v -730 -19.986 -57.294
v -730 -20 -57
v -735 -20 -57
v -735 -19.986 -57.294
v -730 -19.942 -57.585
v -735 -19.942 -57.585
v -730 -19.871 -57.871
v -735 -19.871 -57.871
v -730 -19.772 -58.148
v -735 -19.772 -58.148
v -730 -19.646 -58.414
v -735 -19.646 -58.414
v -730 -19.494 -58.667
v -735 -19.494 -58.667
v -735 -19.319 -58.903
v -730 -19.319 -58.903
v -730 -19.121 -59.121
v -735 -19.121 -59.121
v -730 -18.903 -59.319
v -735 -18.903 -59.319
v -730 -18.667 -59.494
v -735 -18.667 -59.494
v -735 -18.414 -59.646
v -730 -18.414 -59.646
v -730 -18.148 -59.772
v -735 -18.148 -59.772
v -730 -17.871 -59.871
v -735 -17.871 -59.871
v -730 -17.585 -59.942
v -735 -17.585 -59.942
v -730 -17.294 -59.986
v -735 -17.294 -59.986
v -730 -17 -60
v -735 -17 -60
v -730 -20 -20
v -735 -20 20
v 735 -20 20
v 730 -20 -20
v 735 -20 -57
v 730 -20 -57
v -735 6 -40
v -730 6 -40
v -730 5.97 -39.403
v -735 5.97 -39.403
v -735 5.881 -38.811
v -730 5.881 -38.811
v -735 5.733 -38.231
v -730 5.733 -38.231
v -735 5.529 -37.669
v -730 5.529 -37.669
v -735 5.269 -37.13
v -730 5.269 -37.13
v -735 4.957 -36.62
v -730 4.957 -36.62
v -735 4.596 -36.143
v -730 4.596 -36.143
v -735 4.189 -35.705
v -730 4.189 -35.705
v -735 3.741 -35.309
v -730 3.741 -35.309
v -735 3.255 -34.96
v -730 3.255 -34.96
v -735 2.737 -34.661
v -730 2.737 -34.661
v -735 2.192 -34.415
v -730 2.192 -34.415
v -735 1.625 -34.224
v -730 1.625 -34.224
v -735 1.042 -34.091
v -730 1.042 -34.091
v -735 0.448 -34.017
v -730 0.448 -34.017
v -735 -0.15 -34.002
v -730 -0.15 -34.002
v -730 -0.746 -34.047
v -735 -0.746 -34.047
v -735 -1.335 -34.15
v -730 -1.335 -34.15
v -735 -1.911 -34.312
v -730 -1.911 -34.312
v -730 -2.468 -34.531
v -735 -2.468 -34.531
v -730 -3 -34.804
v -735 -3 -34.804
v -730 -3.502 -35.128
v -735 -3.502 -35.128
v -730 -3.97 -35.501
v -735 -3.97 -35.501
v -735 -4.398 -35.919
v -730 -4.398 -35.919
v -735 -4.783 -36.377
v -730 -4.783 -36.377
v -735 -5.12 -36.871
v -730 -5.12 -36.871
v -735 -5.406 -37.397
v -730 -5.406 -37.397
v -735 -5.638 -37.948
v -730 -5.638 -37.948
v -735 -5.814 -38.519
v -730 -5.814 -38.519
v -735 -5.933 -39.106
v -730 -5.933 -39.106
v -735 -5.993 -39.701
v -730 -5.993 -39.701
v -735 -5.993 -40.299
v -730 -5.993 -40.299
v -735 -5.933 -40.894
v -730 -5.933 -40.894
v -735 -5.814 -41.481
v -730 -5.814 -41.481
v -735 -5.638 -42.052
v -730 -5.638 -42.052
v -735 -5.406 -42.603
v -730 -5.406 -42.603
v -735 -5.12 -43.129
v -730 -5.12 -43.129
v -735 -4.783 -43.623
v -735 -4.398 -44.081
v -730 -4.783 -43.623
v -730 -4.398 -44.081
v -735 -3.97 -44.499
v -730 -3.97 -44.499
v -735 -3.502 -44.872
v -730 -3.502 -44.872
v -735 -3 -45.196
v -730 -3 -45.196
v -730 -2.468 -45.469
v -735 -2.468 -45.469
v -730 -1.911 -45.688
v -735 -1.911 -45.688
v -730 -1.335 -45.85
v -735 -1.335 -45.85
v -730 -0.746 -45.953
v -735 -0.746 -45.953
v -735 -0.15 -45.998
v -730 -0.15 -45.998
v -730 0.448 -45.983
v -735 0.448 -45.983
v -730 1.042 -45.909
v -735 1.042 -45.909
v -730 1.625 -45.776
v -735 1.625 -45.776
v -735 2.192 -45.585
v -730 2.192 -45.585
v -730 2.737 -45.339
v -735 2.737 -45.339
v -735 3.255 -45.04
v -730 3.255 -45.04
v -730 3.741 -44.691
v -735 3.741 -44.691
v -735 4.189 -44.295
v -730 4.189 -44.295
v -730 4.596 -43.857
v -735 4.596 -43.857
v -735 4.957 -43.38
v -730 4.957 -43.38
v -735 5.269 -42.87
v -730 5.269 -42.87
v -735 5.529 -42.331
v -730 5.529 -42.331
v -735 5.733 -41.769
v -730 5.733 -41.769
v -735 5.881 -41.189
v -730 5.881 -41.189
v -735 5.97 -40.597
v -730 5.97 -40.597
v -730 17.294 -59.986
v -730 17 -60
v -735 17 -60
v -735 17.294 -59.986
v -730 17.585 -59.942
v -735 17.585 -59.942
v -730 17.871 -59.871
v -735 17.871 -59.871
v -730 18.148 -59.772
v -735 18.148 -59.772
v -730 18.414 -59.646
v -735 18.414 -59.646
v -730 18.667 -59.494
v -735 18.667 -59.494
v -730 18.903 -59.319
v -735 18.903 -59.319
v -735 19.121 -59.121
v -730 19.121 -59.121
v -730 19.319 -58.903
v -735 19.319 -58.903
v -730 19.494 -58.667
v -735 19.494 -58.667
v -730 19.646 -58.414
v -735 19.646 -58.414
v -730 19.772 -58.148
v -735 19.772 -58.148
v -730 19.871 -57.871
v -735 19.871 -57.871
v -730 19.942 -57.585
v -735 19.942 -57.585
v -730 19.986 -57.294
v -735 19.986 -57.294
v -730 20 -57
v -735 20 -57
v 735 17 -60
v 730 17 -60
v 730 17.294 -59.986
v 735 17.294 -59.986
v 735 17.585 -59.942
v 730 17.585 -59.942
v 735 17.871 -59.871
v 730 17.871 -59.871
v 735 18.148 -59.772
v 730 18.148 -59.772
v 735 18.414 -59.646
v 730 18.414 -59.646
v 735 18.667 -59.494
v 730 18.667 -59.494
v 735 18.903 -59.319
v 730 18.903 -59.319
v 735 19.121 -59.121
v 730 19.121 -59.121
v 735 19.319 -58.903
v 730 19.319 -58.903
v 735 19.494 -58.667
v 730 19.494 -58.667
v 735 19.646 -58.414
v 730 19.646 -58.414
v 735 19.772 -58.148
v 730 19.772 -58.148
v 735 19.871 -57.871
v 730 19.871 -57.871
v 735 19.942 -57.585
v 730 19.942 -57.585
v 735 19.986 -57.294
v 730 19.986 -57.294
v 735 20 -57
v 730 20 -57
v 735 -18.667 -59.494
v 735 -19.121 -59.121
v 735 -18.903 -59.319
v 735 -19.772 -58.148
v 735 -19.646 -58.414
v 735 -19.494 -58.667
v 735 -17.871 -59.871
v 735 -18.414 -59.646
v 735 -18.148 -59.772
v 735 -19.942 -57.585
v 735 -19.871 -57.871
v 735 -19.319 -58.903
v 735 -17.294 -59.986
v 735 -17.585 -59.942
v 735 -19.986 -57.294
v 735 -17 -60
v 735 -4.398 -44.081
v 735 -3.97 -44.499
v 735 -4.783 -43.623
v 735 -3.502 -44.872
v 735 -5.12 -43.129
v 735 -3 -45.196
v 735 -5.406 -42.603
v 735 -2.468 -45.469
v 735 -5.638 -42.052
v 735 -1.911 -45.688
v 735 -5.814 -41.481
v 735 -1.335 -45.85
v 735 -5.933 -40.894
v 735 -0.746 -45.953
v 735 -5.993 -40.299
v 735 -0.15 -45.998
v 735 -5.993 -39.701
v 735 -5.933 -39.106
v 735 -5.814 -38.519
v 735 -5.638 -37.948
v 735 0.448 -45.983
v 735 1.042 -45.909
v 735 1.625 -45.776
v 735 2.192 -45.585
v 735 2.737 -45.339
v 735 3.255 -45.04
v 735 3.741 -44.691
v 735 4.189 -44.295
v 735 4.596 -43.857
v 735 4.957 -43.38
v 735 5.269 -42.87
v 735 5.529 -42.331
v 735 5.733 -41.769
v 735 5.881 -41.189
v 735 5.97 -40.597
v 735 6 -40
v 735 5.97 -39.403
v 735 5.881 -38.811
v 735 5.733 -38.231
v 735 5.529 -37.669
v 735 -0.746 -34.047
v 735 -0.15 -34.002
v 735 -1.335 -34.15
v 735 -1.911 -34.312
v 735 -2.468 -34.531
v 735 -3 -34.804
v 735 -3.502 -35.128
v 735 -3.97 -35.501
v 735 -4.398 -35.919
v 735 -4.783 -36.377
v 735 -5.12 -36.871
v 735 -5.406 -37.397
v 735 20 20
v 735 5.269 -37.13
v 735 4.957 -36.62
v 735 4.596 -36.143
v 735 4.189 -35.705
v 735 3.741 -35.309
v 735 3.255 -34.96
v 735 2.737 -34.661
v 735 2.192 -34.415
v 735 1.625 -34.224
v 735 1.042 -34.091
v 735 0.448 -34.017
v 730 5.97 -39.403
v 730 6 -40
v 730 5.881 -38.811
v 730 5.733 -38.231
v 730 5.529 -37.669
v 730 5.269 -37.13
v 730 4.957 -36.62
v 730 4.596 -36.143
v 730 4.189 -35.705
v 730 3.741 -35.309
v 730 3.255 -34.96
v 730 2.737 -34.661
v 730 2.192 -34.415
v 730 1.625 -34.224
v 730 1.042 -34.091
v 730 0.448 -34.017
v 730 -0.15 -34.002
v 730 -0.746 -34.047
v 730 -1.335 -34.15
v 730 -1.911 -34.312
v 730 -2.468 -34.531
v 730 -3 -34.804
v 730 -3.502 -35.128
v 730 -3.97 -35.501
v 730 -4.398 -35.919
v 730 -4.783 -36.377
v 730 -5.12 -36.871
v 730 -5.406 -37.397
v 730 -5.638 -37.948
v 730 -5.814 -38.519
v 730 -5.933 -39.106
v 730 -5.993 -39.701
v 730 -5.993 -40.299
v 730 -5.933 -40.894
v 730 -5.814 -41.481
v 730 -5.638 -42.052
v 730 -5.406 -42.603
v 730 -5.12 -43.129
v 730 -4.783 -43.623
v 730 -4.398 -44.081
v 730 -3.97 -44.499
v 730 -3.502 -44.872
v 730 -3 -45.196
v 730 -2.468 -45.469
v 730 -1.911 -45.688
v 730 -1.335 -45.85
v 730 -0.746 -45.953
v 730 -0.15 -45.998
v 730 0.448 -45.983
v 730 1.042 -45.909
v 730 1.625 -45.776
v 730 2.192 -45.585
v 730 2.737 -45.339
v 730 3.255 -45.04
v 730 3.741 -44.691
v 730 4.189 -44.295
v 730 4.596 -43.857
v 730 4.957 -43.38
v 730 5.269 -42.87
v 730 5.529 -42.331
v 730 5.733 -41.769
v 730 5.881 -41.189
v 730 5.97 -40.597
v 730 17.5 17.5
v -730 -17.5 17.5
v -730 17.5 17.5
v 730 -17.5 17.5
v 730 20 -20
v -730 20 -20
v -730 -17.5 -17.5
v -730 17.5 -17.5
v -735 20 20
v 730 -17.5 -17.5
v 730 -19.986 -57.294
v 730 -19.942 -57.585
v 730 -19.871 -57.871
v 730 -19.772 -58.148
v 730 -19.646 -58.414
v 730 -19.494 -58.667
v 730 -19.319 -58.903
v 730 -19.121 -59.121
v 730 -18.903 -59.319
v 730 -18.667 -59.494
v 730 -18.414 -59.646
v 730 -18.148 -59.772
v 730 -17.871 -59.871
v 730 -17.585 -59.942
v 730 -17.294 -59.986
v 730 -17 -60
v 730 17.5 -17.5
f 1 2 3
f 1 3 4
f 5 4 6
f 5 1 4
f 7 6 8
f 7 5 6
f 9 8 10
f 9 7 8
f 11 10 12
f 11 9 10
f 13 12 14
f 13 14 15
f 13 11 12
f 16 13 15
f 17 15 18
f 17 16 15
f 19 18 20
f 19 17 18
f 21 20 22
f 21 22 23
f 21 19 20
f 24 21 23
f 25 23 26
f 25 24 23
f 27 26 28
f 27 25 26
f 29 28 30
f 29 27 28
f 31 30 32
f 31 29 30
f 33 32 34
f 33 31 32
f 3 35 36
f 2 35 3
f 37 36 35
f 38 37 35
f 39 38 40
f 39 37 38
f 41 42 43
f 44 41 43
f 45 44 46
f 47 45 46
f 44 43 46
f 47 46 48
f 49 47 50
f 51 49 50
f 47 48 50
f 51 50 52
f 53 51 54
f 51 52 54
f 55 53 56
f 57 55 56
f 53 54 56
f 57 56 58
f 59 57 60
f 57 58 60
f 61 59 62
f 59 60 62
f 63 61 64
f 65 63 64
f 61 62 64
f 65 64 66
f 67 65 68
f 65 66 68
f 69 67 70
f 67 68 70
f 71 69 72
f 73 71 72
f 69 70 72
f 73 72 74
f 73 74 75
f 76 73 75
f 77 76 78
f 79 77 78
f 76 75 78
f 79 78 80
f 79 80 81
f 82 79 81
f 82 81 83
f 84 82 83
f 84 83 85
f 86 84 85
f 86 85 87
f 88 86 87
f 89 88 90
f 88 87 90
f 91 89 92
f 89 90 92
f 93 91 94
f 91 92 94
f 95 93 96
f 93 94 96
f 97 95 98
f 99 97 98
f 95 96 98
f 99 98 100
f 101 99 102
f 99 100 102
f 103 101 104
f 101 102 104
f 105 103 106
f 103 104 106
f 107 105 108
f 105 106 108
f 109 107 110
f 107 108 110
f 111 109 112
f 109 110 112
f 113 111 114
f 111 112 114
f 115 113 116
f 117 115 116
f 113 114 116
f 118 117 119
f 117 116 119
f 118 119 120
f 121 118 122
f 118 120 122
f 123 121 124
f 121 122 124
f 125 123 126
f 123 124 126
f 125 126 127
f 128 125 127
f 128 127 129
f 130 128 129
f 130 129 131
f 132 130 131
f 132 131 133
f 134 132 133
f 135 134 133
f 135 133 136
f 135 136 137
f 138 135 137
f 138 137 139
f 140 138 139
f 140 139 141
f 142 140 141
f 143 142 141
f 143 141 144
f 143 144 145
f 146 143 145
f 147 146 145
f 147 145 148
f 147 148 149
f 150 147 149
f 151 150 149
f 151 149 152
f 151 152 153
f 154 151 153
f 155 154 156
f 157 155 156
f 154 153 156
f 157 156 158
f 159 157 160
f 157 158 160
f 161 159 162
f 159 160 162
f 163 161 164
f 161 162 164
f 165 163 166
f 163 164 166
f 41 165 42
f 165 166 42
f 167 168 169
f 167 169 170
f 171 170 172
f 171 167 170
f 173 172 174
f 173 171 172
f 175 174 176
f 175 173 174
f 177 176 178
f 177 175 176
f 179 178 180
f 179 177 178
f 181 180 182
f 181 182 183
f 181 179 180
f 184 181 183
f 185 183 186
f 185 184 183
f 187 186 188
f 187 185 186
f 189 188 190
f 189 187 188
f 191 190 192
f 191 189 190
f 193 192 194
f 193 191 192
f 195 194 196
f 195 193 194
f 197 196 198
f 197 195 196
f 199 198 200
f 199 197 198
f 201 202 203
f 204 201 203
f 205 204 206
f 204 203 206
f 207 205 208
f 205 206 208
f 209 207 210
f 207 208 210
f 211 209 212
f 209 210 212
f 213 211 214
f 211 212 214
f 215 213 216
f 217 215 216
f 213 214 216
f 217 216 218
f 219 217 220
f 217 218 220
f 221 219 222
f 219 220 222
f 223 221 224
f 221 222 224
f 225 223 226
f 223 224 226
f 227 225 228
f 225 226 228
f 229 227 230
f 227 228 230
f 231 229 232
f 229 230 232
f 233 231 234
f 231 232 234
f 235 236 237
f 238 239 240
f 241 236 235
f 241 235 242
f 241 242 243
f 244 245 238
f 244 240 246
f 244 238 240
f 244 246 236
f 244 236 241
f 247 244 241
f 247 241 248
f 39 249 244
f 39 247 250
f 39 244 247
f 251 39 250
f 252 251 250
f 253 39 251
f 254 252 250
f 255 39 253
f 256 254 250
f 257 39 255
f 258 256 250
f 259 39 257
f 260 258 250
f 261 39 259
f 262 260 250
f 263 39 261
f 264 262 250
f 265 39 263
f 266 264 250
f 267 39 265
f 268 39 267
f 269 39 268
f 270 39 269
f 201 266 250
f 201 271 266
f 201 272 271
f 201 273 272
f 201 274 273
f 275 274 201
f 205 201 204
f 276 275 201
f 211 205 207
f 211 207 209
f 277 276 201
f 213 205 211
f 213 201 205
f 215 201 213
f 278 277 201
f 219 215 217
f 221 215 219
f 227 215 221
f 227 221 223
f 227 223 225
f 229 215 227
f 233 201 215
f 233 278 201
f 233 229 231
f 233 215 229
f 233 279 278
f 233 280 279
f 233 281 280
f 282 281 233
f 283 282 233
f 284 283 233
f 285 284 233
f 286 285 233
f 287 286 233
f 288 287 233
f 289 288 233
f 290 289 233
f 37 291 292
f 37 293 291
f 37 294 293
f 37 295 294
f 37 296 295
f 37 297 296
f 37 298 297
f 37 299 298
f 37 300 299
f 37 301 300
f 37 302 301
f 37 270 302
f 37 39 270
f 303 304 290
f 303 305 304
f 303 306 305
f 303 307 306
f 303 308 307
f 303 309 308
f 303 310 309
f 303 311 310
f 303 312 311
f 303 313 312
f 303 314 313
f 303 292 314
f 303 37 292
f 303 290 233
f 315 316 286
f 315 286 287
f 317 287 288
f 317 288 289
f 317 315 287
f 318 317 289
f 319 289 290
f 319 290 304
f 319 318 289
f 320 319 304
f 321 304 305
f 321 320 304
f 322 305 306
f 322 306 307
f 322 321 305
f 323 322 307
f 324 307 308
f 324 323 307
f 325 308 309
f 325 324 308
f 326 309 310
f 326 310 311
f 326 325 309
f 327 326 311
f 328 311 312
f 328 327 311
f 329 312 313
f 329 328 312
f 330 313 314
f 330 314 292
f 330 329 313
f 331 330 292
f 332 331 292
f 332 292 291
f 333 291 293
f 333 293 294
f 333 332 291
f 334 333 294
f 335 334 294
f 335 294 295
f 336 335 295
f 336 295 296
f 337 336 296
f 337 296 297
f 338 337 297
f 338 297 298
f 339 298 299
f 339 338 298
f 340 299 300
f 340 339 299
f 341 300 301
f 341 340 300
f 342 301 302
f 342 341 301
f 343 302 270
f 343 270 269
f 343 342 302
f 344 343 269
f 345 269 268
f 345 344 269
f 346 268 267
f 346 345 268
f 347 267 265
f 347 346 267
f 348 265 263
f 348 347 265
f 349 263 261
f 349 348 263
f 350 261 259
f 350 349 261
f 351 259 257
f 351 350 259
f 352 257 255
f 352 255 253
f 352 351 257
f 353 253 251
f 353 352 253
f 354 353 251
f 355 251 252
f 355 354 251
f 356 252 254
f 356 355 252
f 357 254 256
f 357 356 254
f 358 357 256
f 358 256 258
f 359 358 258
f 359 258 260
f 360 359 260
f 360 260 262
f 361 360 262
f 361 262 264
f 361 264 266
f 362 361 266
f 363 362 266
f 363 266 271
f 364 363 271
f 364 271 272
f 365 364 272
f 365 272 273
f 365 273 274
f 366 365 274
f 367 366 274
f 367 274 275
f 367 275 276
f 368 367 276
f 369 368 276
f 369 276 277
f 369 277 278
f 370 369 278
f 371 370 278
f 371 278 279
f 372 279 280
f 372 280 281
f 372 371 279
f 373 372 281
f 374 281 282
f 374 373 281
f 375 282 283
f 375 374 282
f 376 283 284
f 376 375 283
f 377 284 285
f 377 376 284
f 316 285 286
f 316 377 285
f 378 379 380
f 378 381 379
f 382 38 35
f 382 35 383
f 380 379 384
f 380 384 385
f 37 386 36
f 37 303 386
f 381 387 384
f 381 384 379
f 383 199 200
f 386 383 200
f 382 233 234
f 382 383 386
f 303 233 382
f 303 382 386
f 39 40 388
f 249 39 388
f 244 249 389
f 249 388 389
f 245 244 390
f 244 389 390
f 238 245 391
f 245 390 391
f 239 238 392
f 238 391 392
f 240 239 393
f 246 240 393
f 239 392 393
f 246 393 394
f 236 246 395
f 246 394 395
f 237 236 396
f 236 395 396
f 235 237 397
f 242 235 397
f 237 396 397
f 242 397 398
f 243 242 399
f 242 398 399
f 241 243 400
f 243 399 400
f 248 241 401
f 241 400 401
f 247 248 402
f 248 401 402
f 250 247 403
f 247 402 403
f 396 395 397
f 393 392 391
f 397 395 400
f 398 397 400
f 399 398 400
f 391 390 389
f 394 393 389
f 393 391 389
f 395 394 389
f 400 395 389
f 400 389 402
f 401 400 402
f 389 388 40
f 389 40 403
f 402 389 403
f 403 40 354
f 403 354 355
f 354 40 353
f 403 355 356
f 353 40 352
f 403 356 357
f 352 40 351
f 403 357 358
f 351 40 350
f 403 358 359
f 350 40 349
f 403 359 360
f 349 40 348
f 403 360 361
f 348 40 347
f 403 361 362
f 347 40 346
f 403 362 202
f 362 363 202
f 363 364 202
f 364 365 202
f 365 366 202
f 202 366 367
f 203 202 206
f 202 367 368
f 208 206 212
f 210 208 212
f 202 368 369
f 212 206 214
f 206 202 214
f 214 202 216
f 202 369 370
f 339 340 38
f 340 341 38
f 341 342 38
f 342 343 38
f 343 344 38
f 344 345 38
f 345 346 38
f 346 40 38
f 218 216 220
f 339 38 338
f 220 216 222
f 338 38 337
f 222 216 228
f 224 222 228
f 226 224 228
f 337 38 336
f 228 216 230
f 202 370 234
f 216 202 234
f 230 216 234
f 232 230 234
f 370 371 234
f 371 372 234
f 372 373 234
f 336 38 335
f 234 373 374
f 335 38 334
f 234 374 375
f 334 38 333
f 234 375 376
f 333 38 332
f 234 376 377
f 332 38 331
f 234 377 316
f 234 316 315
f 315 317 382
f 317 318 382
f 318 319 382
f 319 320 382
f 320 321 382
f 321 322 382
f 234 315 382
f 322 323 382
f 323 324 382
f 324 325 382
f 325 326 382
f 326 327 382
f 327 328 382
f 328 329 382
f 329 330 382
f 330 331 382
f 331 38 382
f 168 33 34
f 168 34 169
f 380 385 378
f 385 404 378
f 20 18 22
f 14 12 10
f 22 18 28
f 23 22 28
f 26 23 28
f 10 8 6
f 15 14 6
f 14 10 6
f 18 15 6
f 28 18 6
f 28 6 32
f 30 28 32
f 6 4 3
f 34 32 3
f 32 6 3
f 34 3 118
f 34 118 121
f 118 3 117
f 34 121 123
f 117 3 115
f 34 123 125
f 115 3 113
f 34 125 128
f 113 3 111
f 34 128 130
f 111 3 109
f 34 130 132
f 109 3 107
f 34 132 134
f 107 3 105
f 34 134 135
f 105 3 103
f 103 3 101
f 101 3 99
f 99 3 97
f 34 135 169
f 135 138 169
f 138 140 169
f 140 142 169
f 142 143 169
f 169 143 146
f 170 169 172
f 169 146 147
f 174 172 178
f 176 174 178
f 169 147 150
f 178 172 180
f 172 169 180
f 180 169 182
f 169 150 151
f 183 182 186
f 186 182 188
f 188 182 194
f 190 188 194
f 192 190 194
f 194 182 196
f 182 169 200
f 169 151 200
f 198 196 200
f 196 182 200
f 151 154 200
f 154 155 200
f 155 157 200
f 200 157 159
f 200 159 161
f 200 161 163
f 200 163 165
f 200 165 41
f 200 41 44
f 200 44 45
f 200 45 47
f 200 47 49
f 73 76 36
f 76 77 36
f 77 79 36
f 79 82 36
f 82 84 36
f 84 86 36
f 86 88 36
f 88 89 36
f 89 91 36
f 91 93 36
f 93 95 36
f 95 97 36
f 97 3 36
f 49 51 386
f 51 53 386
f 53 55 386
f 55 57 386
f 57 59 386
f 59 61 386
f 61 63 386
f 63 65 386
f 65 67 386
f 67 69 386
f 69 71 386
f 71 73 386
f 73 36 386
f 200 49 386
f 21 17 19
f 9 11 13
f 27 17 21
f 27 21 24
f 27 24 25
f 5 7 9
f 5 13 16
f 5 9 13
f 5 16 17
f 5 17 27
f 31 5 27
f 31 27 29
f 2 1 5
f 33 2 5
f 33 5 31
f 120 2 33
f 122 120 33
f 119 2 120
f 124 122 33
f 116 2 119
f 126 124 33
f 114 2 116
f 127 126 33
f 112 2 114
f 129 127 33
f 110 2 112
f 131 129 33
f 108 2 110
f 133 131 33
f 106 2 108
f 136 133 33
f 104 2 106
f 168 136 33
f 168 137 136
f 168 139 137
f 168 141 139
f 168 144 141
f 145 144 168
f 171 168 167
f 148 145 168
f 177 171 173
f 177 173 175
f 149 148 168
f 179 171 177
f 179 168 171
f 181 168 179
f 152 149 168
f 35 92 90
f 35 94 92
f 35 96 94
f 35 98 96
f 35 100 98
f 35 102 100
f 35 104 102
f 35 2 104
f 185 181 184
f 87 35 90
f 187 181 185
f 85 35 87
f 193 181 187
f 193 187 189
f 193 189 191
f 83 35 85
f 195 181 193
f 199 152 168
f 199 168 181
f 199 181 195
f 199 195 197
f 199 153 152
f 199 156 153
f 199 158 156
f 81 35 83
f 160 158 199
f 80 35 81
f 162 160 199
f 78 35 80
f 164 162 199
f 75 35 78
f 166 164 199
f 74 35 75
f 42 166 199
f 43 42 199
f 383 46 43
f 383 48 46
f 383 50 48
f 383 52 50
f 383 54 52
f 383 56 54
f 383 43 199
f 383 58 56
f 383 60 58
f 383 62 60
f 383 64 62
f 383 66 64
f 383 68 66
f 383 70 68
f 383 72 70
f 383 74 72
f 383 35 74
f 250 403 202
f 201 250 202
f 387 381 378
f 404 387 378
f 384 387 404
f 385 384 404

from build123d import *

# Parameters (mm, degrees)
F0_W     = 40
F0_H     = 40
F0_W_2   = 35
F0_H_2   = 35
F1_DEPTH = 730
F2_R     = 6
F3_DEPTH = 5


with BuildPart() as f1:
    # F0 (on Right) → F1 (new body, symmetric)
    with BuildSketch(Plane.YZ):
        Rectangle(F0_W, F0_H)
        Rectangle(F0_W_2, F0_H_2, mode=Mode.SUBTRACT)
    extrude(amount=F1_DEPTH, both=True)

    # F2 (on face) → F3 (join)
    with BuildSketch(Plane.YZ.offset(730)):
        with BuildLine():
            Line((20, -20), (20, 20))
            Line((20, 20), (-20, 20))
            Line((-20, 20), (-20, -57))
            ThreePointArc((-20, -57), (-19.1213203436, -59.1213203436), (-17, -60))
            Line((-17, -60), (17, -60))
            ThreePointArc((17, -60), (19.1213203436, -59.1213203436), (20, -57))
            Line((20, -57), (20, -20))
        make_face()
        with Locations((0, -40)):
            Circle(F2_R, mode=Mode.SUBTRACT)
    extrude(amount=F3_DEPTH)

    # F4: F1 across plane


with BuildPart() as f1_1:
    add(f1.part)
    add(f1.part.mirror(Plane.YZ))


solid = f1_1.part
